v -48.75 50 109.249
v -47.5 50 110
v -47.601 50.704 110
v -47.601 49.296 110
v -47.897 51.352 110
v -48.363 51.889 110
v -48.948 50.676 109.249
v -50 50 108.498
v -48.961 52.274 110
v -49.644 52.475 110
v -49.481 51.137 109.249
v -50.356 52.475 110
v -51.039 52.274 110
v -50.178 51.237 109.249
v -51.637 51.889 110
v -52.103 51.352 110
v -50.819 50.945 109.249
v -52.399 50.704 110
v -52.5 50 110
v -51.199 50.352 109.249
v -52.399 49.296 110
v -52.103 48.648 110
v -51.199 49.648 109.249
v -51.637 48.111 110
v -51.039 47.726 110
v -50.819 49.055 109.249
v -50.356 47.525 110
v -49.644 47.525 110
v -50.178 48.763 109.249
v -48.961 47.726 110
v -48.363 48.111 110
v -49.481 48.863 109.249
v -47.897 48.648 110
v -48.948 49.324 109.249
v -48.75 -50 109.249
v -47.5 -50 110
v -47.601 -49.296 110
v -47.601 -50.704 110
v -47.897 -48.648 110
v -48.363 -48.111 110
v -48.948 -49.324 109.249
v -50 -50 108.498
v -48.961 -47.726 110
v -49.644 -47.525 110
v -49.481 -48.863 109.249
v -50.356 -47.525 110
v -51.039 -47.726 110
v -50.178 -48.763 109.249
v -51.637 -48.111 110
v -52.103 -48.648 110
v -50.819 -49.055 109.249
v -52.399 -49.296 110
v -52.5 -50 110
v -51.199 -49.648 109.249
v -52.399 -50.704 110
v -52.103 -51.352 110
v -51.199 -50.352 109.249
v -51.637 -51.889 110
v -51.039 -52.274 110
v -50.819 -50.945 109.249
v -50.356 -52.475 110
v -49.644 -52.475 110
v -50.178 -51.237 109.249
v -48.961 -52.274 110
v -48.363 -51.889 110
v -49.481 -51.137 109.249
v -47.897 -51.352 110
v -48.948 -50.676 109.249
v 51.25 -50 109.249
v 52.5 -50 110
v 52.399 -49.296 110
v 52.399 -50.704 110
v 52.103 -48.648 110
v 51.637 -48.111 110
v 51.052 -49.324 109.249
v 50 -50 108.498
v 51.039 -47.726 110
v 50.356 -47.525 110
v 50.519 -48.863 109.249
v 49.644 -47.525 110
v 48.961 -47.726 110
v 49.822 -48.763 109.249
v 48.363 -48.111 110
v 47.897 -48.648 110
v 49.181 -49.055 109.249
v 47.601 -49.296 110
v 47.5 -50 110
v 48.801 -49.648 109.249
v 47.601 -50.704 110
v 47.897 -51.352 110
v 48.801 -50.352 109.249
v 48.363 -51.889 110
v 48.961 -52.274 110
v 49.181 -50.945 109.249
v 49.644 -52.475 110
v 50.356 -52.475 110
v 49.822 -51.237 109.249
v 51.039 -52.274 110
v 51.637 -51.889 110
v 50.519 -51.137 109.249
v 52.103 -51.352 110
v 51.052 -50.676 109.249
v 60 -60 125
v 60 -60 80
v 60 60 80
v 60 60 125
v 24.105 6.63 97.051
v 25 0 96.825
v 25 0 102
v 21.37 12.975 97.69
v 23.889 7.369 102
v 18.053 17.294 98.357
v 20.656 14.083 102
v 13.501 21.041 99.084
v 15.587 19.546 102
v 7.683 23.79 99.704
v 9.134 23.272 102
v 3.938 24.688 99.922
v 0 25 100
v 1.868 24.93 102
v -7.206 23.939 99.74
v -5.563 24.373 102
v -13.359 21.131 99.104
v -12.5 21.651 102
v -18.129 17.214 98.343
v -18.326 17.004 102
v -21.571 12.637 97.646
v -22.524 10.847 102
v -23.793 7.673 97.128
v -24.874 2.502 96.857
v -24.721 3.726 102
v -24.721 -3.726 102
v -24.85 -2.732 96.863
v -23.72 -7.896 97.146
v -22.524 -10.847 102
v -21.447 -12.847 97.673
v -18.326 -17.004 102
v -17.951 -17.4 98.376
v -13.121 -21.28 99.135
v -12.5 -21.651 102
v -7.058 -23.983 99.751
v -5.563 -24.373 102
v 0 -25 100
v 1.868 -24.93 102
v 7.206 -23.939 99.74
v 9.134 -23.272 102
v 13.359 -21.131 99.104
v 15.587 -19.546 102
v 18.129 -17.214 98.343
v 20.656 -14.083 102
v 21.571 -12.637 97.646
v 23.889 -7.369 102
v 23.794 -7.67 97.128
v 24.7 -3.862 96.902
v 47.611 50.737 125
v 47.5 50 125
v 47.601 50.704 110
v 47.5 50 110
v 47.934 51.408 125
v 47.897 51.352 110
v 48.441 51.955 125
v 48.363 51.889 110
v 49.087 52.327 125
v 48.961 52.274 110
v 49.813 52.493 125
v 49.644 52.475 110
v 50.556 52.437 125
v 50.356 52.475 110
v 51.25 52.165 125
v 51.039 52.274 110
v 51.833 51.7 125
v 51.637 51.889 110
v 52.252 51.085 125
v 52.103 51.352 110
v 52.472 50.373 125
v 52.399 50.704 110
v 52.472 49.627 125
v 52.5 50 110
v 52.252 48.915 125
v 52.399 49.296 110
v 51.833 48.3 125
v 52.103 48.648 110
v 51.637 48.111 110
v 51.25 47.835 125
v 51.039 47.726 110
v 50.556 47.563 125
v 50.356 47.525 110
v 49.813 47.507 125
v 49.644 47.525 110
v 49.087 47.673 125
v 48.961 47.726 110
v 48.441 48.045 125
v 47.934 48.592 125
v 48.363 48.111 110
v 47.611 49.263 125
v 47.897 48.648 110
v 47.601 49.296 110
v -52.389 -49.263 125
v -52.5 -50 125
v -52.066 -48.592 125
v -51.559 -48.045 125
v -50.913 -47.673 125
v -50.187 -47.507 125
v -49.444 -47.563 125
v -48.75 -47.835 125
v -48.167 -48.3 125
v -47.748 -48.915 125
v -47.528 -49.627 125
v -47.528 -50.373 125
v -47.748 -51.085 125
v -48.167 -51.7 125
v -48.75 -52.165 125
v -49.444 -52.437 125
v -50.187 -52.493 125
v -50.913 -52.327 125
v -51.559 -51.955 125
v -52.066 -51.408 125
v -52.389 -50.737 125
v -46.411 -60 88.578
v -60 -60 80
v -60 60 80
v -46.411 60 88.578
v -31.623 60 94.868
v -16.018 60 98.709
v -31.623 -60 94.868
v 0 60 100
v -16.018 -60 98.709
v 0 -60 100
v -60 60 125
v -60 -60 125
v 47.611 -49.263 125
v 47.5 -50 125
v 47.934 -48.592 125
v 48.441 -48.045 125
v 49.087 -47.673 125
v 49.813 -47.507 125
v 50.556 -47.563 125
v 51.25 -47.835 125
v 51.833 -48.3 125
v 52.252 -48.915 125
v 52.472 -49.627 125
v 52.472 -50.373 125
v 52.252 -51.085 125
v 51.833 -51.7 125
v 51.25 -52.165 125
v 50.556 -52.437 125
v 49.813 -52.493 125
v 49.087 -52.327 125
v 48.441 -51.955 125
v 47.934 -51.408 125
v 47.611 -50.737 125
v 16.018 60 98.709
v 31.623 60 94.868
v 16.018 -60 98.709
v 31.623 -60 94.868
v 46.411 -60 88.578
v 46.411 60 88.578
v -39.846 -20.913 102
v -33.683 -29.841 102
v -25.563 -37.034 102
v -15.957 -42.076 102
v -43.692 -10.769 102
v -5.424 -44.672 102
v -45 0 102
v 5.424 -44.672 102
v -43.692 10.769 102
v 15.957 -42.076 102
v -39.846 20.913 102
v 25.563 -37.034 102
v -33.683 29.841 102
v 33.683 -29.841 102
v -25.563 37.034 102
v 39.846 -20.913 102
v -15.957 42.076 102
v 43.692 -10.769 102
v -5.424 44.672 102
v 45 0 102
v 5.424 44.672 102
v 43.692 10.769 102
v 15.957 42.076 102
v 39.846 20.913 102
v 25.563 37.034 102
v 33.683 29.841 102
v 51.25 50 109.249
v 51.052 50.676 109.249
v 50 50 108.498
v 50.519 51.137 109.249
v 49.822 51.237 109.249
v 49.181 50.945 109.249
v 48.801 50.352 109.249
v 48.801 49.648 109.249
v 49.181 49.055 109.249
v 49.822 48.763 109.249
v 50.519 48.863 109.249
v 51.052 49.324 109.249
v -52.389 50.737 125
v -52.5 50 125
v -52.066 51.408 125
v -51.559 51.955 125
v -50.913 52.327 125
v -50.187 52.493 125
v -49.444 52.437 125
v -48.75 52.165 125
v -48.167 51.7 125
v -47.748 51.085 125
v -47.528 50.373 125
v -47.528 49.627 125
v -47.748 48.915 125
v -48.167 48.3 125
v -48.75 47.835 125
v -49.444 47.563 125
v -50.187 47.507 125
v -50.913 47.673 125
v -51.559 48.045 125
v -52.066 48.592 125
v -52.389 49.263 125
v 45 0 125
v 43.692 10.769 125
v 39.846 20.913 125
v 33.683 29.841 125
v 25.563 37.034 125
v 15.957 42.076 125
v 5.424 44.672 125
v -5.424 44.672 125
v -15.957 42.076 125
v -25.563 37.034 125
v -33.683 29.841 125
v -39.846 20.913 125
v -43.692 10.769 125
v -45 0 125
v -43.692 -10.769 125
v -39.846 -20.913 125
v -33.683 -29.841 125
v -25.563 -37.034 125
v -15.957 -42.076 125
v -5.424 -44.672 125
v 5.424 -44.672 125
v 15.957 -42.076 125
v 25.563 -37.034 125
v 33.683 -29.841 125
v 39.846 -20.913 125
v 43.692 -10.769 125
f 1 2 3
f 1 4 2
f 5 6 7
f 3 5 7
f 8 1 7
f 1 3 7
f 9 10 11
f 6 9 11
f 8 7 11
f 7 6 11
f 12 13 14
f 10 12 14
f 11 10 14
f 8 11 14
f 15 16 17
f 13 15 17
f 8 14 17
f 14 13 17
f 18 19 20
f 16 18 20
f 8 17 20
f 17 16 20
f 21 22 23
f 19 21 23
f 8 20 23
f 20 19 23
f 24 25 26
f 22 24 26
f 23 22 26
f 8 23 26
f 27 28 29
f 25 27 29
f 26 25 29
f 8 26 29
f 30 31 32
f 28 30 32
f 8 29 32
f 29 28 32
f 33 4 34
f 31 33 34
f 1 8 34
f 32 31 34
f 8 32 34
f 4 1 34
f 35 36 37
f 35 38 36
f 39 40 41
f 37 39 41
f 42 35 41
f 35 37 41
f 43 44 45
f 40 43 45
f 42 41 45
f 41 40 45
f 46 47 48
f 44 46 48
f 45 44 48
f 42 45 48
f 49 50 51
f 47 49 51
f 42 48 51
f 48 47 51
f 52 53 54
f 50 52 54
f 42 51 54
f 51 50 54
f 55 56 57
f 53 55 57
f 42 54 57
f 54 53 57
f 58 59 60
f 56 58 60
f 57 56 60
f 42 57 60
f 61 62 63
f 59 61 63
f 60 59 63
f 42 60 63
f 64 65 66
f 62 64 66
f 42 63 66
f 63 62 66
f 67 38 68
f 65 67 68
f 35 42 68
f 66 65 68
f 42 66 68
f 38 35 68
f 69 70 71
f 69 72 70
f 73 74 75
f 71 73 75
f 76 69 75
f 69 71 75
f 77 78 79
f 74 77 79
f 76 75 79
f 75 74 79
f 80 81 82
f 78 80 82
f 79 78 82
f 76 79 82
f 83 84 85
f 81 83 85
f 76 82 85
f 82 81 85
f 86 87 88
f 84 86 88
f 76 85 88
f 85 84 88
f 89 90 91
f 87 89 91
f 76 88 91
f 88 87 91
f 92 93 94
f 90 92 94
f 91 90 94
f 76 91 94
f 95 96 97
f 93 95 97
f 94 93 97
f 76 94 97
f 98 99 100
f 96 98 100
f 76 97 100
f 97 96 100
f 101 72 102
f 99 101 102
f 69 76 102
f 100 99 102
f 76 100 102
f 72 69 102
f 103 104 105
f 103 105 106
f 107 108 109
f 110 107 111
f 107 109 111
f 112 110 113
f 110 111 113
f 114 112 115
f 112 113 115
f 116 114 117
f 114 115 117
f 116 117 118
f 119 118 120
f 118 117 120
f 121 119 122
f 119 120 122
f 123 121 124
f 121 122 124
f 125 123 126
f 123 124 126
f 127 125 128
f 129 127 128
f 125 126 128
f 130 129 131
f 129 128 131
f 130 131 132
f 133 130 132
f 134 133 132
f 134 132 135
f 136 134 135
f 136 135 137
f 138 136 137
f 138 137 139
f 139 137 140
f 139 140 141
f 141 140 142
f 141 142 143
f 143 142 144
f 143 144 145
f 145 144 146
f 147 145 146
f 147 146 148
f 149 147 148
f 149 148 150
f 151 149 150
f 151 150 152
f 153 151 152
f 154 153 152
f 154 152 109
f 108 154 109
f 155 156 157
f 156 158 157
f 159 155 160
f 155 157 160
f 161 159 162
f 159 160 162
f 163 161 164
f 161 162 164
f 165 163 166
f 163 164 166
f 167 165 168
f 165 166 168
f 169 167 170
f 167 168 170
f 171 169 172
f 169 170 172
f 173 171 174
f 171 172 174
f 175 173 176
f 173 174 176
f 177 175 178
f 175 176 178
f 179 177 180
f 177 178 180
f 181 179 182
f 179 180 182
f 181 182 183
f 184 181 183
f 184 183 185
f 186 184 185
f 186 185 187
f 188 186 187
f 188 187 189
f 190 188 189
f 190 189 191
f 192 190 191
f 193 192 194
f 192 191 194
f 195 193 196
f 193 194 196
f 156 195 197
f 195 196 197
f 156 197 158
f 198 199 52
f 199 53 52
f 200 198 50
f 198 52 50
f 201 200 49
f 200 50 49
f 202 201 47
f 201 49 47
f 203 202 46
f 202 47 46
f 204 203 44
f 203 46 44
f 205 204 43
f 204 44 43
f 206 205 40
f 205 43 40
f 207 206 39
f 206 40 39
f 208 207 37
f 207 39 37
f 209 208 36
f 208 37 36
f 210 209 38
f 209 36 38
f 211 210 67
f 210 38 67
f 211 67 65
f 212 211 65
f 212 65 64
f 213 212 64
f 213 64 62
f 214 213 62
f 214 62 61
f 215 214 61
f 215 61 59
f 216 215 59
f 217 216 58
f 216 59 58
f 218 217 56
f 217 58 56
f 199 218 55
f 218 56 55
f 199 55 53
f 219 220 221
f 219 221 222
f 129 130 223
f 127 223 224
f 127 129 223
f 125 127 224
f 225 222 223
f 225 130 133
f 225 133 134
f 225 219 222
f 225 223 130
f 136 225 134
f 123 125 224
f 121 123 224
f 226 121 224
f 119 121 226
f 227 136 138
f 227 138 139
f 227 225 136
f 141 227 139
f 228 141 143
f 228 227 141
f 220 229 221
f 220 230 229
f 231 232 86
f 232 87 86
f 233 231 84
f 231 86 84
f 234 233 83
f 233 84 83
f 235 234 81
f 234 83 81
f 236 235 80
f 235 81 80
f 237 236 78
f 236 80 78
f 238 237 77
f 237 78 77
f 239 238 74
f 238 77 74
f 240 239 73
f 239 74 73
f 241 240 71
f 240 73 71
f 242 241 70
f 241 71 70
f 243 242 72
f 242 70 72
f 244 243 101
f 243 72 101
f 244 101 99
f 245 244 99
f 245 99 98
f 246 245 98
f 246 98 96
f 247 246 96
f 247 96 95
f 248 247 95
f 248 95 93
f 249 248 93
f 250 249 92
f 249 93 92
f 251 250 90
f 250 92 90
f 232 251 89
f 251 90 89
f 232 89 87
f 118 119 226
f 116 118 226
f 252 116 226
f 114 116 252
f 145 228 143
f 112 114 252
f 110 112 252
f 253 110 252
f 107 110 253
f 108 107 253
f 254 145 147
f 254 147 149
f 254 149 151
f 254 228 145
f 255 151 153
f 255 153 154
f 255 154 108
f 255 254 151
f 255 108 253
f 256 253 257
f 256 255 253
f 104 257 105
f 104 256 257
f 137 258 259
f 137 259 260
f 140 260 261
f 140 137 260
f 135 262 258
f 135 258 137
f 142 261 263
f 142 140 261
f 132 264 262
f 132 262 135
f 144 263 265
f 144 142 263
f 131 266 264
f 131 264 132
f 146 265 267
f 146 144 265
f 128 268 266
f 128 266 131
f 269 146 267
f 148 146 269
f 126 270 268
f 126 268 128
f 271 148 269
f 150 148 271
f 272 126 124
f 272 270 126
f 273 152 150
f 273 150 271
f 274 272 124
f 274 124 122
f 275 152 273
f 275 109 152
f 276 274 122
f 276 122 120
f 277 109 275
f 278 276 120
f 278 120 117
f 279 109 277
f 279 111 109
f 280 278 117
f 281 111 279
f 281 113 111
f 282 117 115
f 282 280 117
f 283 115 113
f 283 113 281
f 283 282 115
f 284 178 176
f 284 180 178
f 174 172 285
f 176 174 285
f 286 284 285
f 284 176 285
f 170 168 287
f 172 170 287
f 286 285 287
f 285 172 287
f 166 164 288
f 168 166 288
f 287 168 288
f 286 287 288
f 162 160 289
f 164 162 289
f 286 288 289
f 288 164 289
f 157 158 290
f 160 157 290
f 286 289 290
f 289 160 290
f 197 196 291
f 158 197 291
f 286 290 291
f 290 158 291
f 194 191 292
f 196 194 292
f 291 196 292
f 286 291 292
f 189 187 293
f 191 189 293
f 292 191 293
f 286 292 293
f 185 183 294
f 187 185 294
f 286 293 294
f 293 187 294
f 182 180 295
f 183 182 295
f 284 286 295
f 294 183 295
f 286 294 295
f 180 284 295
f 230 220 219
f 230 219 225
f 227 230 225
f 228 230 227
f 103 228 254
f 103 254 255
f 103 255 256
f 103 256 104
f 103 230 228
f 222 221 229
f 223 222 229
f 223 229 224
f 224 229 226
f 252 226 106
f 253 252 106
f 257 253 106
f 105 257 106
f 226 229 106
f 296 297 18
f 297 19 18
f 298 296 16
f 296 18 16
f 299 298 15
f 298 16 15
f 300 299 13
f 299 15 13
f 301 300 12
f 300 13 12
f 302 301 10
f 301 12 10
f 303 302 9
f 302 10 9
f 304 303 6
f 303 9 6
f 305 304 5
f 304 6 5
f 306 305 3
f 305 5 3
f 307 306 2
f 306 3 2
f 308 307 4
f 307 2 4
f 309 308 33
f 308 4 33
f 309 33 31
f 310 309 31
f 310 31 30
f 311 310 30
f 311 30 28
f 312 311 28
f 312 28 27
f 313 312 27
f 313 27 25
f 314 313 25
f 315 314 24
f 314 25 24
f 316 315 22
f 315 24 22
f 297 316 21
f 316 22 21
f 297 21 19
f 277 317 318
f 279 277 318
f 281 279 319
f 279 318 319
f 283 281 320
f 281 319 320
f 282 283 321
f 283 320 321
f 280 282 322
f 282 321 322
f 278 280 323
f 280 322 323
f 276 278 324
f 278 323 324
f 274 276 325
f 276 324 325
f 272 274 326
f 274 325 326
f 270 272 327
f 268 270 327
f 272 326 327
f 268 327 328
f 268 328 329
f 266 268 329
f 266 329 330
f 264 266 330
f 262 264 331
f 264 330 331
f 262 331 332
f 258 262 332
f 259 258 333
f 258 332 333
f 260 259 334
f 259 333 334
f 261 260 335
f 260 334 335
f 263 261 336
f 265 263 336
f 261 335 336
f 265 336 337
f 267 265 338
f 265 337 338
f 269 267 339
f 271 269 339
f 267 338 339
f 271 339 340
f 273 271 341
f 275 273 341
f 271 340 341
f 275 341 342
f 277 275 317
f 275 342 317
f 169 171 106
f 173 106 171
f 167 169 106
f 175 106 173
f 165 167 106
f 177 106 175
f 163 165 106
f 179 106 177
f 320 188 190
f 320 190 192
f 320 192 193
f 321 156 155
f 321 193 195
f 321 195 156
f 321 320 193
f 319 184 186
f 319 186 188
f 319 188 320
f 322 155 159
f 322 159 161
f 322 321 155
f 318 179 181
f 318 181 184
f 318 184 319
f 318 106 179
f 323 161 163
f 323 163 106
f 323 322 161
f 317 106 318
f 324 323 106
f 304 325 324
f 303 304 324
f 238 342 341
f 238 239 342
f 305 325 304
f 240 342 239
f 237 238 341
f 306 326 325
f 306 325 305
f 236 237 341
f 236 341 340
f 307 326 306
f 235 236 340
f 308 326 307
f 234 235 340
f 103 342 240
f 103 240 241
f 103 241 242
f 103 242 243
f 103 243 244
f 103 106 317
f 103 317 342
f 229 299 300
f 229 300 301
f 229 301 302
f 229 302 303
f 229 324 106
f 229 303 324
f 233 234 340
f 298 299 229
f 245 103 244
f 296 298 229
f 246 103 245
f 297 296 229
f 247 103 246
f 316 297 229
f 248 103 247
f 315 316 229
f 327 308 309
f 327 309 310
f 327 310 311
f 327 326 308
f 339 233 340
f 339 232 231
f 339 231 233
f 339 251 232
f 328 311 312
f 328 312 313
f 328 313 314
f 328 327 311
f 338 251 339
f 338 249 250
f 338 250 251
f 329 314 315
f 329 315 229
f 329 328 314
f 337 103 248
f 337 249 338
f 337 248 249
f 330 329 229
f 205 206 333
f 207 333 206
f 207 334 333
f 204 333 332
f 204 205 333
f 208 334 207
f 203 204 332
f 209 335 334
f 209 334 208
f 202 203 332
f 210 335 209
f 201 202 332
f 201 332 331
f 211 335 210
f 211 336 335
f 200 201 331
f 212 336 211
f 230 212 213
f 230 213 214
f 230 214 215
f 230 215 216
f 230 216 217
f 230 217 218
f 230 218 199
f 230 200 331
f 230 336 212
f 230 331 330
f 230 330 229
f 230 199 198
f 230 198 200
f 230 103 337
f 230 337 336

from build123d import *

# Parameters (mm, degrees)
F1_DEPTH = 60
F2_R     = 25
F3_DEPTH = 50
F4_R     = 45
F5_DEPTH = 23
F7_D     = 5
F7_DEPTH = 15
F7_TIP   = 1.5021515476


with BuildPart() as f1:
    # F0 (on Front) → F1 (new body, symmetric)
    with BuildSketch(Plane.XZ):
        with BuildLine():
            ThreePointArc((0, 100), (31.6227766017, 94.8683298051), (60, 80))
            Line((60, 80), (60, 125))
            Line((60, 125), (-60, 125))
            Line((-60, 125), (-60, 80))
            ThreePointArc((-60, 80), (-31.6227766017, 94.8683298051), (0, 100))
        make_face()
    extrude(amount=F1_DEPTH, both=True)

    # F2 (on face) → F3 (cut)
    with BuildSketch(Plane.XY.offset(125)):
        Circle(F2_R)
    extrude(amount=-F3_DEPTH, mode=Mode.SUBTRACT)

    # F4 (on face) → F5 (cut)
    with BuildSketch(Plane.XY.offset(125)):
        Circle(F4_R)
    extrude(amount=-F5_DEPTH, mode=Mode.SUBTRACT)

    # F7
    with Locations(Plane.XY.offset(125)):
        with Locations((-50, 50), (50, 50), (50, -50), (-50, -50)):
            Hole(F7_D / 2, depth=F7_DEPTH)
            with Locations((0, 0, -(F7_DEPTH + F7_TIP / 2))):  # 118° drill point
                Cone(0, F7_D / 2, F7_TIP, mode=Mode.SUBTRACT)


solid = f1.part
